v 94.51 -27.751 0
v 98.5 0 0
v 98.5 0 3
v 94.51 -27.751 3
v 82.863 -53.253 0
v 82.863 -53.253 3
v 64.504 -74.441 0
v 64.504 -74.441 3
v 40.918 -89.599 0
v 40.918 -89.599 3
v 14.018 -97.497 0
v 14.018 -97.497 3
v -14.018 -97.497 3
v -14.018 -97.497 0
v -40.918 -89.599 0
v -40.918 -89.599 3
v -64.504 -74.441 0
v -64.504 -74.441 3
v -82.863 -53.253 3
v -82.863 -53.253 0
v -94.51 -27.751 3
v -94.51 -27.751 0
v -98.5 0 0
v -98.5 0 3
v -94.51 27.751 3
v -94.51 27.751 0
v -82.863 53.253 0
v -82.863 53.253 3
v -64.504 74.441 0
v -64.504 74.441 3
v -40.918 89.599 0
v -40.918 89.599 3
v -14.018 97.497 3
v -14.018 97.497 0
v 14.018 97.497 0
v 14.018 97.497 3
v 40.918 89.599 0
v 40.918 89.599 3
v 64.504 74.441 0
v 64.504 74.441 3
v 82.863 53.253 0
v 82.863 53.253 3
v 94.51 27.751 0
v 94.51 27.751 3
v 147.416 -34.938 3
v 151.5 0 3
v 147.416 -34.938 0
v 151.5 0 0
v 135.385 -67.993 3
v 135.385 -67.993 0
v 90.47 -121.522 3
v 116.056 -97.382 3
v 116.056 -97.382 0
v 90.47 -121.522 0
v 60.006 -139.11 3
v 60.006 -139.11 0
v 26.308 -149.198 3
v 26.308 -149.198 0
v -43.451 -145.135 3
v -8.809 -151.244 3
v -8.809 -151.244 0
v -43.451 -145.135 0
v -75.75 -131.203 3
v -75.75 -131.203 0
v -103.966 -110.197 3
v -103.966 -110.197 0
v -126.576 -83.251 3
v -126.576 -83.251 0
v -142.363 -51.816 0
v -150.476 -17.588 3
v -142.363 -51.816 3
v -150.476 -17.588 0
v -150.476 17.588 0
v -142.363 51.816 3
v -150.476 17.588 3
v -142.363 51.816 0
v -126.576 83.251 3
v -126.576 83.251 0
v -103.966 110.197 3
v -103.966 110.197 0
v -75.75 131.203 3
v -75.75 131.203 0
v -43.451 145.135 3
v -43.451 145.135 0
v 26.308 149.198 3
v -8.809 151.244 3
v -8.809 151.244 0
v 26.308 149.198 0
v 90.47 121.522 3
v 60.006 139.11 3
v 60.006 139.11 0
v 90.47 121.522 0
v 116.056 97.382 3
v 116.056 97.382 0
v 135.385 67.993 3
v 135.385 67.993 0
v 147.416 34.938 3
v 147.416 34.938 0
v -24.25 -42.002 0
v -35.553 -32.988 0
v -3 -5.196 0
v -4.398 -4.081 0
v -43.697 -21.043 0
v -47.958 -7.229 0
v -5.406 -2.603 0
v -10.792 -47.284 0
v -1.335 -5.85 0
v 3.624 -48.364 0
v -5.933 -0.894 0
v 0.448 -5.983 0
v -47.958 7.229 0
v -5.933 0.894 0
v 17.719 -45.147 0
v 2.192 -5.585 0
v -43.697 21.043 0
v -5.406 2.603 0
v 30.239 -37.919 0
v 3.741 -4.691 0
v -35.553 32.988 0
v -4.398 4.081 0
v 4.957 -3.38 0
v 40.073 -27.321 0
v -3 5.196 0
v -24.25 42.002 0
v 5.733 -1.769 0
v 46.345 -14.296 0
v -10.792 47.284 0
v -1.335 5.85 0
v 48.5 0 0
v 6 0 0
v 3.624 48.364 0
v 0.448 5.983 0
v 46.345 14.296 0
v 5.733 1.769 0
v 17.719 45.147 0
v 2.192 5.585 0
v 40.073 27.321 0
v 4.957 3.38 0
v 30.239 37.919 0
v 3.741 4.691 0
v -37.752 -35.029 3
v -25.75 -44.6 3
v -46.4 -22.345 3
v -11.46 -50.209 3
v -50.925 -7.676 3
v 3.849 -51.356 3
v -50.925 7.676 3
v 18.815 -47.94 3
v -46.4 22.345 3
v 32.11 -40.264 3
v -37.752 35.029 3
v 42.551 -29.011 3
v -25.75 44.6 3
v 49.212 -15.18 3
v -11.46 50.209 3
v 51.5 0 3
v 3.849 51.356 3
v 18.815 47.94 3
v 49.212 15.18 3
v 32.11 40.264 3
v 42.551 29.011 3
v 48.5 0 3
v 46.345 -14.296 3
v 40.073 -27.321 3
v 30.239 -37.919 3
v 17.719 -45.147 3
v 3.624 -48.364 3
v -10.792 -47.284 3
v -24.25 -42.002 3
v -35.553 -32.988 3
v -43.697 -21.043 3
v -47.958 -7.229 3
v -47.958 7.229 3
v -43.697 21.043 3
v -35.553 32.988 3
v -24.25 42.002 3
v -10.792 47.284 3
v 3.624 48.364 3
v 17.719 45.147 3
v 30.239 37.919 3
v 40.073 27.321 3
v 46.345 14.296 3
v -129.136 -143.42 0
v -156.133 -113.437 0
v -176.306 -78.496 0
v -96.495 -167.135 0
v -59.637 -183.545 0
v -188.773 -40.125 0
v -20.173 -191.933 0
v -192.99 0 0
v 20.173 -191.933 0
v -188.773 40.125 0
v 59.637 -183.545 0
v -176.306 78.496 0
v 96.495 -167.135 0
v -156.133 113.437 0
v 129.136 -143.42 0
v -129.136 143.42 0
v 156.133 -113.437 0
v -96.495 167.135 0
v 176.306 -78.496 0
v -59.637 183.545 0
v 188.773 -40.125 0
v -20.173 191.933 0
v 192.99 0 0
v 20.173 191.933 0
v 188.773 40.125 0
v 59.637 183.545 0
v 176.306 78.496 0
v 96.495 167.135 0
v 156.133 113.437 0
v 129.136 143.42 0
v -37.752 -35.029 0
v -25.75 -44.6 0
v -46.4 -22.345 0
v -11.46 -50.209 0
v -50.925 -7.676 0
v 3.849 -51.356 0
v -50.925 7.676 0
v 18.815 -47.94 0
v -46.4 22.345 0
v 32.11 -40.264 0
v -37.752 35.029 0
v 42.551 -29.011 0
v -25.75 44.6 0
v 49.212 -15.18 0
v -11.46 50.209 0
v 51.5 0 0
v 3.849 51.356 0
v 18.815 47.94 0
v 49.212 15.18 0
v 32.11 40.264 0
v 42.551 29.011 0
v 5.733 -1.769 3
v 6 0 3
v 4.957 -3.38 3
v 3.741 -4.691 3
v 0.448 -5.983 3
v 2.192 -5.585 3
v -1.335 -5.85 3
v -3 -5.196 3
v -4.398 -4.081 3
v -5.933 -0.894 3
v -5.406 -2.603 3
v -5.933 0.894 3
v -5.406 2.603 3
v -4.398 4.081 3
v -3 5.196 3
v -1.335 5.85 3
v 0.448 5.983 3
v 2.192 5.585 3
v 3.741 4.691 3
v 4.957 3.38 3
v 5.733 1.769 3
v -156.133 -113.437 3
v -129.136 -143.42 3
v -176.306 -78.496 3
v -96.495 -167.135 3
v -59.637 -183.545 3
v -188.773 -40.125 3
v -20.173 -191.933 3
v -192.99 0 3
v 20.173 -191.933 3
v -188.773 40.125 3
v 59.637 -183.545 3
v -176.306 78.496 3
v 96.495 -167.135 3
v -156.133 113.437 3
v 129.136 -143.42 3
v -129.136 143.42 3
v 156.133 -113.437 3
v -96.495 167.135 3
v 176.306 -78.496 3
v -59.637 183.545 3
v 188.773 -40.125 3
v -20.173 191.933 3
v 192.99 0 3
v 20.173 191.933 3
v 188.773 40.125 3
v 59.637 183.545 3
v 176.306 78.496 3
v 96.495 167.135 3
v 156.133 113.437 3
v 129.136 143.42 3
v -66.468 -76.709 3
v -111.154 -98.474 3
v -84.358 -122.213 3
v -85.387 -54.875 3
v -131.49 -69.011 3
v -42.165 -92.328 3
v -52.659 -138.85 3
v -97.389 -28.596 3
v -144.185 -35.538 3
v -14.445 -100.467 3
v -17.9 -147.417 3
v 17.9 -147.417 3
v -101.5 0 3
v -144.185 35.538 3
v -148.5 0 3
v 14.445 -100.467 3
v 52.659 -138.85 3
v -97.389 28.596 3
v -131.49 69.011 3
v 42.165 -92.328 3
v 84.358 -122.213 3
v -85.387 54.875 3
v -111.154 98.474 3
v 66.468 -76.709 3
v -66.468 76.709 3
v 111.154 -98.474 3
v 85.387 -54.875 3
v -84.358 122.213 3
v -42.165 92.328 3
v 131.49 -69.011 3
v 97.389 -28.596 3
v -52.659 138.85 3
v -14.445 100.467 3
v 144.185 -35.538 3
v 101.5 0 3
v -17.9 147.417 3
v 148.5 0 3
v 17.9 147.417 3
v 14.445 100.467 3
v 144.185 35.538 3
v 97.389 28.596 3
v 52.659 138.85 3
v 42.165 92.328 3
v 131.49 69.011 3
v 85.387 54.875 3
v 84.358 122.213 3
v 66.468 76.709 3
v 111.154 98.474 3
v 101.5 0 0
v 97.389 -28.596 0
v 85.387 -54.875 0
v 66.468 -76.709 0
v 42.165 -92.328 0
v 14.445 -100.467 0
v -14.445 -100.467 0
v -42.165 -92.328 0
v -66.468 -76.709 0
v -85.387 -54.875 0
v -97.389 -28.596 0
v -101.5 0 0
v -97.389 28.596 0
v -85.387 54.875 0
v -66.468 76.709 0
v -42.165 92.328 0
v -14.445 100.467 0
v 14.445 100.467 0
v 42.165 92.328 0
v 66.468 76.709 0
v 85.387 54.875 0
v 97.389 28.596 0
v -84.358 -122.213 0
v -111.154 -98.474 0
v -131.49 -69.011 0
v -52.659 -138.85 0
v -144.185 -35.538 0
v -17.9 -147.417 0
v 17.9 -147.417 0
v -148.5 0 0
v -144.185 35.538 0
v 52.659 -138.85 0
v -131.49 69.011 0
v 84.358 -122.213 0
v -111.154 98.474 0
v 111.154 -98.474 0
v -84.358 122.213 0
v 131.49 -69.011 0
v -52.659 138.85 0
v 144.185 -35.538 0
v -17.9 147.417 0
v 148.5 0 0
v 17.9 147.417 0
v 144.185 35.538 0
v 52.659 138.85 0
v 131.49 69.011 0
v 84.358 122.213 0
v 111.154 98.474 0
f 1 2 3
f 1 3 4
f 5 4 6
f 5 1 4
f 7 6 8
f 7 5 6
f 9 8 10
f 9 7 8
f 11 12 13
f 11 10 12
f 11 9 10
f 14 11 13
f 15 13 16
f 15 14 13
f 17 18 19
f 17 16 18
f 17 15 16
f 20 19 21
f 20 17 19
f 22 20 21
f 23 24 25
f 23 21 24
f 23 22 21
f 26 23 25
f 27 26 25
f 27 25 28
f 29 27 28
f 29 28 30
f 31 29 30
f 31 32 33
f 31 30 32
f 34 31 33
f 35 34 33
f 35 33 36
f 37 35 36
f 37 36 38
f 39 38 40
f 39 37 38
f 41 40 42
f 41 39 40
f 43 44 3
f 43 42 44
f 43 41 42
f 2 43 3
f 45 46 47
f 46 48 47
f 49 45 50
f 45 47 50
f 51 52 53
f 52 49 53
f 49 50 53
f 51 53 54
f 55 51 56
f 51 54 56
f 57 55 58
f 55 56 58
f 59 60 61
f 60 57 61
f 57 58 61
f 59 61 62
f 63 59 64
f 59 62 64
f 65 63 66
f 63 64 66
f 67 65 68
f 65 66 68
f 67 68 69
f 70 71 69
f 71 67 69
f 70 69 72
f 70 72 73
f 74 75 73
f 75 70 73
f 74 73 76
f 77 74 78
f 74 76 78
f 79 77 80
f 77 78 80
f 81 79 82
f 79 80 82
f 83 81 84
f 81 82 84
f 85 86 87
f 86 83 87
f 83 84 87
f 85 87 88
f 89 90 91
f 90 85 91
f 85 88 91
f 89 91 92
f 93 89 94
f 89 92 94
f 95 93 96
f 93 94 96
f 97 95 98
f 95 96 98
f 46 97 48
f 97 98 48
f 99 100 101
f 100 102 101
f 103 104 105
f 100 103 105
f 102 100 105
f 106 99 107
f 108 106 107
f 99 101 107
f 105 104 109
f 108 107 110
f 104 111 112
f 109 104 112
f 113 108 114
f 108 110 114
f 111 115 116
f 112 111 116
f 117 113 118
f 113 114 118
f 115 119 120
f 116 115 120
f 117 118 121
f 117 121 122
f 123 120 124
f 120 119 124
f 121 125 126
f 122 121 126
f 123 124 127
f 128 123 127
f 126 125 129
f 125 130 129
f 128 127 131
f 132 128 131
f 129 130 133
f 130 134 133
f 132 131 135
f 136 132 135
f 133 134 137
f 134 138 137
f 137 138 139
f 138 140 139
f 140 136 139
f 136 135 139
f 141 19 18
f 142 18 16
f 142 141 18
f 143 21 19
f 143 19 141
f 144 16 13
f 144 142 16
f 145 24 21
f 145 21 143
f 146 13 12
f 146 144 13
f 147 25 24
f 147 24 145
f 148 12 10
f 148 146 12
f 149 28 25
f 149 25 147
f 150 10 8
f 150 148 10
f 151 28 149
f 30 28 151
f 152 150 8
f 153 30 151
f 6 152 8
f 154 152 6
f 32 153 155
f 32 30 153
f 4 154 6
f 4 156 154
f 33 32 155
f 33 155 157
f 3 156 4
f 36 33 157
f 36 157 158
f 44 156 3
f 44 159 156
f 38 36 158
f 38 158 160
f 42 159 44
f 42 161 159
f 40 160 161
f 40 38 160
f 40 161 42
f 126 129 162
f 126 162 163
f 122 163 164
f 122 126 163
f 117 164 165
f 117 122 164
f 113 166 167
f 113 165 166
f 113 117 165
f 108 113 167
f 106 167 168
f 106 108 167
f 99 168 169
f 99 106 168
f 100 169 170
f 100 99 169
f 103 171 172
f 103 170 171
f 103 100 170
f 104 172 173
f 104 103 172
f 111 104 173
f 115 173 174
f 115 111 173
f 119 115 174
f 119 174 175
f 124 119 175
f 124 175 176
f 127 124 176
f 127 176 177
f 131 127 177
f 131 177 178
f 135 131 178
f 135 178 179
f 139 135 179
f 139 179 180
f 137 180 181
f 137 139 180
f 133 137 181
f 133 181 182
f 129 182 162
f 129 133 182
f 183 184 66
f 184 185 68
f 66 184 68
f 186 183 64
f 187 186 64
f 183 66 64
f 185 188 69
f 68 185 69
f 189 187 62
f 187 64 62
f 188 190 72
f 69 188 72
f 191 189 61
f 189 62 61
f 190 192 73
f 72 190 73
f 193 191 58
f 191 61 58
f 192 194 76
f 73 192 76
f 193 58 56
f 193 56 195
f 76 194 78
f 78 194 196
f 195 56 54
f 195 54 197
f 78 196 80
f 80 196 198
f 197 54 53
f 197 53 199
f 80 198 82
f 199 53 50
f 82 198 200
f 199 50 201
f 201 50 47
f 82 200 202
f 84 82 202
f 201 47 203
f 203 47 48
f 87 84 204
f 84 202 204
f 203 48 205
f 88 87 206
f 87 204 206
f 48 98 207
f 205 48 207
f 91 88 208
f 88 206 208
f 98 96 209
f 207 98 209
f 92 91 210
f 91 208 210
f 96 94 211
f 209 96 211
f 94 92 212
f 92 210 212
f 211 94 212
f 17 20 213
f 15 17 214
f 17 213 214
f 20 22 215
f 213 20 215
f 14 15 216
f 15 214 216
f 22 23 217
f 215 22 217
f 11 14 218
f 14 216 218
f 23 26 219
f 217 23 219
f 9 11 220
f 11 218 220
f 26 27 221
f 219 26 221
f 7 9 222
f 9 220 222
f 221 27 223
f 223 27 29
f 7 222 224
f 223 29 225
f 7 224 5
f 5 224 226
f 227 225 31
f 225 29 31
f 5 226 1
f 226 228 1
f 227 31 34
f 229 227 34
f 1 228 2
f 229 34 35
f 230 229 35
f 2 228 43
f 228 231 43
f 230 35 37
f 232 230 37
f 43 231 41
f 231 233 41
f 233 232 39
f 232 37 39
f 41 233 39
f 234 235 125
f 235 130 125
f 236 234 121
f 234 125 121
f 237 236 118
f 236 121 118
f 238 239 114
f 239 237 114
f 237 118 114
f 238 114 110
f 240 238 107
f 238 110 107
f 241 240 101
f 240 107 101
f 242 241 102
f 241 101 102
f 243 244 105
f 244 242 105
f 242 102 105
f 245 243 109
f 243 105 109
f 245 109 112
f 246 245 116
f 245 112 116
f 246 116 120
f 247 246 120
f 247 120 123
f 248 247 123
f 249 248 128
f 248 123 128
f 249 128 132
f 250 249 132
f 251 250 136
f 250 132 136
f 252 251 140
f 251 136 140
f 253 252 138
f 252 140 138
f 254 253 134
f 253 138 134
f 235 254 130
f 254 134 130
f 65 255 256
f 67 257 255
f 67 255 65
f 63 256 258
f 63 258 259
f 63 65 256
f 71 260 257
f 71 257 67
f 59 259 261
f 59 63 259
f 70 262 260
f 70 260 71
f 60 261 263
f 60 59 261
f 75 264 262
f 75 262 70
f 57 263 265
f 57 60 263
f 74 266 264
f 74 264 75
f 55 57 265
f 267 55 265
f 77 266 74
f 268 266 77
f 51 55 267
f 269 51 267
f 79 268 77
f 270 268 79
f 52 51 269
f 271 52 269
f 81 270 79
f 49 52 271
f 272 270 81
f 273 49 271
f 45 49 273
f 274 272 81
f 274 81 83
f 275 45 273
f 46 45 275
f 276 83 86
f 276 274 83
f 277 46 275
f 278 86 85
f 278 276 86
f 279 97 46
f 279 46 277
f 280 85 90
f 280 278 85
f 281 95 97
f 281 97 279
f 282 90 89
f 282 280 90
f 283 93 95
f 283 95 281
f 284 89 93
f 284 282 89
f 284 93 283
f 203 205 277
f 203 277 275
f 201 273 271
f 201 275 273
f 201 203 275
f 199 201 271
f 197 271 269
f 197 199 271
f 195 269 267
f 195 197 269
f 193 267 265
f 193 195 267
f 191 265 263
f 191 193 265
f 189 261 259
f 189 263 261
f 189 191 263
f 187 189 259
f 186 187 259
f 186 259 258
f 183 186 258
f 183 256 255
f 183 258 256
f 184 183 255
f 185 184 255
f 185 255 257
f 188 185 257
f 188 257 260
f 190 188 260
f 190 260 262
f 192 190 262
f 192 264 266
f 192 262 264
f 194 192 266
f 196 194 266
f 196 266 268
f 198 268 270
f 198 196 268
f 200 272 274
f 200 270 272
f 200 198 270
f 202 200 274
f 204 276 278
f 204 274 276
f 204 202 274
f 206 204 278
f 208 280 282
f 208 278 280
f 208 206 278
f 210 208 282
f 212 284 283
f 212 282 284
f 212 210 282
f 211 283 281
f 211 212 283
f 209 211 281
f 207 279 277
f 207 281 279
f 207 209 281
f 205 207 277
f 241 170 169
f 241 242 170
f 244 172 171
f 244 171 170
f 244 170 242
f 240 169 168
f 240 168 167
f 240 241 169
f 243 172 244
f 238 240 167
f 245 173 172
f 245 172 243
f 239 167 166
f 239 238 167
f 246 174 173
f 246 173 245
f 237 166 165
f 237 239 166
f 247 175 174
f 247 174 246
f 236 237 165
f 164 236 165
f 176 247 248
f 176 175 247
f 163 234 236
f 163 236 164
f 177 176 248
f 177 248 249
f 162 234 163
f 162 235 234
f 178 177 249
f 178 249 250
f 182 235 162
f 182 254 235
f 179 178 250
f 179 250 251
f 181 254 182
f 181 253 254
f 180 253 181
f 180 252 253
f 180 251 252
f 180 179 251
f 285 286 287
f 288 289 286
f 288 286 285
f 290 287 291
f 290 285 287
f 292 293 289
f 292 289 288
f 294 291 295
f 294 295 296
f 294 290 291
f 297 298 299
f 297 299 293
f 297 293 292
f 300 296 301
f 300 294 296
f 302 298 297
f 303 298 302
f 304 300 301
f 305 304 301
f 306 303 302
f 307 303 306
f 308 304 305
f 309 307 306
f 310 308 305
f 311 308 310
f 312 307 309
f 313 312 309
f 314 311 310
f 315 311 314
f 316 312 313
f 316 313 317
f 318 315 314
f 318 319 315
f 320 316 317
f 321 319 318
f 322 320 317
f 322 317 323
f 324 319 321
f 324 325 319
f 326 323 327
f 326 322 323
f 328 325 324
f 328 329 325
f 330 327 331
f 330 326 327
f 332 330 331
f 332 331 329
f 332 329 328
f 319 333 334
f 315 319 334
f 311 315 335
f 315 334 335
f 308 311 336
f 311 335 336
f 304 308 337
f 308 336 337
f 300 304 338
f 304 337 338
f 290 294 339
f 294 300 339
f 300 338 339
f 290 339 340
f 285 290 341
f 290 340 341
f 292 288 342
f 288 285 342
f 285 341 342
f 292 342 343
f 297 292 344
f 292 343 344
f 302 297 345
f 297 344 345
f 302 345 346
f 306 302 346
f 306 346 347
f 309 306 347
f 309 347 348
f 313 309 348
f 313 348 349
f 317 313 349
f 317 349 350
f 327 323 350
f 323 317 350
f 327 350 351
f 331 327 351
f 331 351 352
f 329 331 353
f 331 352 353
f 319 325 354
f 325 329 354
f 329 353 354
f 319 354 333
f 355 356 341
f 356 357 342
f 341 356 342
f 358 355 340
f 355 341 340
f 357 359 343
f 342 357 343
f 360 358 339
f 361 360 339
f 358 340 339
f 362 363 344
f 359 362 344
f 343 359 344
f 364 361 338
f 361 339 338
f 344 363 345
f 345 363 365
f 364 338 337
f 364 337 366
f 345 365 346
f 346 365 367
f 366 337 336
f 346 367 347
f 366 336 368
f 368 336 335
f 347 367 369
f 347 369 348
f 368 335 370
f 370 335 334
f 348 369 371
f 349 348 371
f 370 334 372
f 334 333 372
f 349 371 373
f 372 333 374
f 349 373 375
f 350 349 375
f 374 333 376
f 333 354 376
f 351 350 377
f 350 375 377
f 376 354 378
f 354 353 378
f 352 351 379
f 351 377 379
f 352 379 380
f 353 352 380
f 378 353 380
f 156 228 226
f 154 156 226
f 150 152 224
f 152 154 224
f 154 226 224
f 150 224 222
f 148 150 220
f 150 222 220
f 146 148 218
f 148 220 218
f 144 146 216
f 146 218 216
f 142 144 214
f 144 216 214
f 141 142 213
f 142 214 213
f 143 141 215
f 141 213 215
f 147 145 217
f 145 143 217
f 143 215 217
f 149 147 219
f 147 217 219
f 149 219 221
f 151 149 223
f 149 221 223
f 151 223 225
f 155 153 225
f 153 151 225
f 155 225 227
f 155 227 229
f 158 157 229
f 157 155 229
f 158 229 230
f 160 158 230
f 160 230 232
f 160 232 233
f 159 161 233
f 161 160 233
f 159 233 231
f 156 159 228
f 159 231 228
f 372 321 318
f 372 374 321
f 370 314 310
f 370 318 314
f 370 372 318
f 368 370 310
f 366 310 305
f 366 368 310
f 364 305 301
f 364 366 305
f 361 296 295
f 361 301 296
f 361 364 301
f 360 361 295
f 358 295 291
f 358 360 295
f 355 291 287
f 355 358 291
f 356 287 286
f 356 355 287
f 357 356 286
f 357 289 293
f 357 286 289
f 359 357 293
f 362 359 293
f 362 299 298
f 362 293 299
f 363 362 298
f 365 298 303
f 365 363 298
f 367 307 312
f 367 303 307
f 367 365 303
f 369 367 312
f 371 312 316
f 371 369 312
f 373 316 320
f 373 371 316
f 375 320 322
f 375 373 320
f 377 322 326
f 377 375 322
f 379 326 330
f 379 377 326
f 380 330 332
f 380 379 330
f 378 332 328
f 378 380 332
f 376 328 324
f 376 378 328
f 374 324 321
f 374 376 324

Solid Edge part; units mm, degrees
sketch "Sketch1" plane through (0, 0, 0) normal (0, 0, 1) x (1, 0, 0)
  circle A0 centre (0, 0) radius 6
  circle A1 centre (0, 0) radius 48.5
  circle A2 centre (0, 0) radius 51.5
  circle A3 centre (0, 0) radius 98.5
  circle A4 centre (0, 0) radius 101.5
  circle A5 centre (0, 0) radius 148.5
  circle A6 centre (0, 0) radius 151.5
  circle A7 centre (0, 0) radius 192.9904
  dimension "D1" = 1.5
  dimension "D2" = 1.5
  dimension "D3" = 1.5
  dimension "D4" = 1.5
  dimension "D5" = 1.5
  dimension "D6" = 1.5
extrude "Protrusion1" add sketch "Sketch1" along normal blind 3
